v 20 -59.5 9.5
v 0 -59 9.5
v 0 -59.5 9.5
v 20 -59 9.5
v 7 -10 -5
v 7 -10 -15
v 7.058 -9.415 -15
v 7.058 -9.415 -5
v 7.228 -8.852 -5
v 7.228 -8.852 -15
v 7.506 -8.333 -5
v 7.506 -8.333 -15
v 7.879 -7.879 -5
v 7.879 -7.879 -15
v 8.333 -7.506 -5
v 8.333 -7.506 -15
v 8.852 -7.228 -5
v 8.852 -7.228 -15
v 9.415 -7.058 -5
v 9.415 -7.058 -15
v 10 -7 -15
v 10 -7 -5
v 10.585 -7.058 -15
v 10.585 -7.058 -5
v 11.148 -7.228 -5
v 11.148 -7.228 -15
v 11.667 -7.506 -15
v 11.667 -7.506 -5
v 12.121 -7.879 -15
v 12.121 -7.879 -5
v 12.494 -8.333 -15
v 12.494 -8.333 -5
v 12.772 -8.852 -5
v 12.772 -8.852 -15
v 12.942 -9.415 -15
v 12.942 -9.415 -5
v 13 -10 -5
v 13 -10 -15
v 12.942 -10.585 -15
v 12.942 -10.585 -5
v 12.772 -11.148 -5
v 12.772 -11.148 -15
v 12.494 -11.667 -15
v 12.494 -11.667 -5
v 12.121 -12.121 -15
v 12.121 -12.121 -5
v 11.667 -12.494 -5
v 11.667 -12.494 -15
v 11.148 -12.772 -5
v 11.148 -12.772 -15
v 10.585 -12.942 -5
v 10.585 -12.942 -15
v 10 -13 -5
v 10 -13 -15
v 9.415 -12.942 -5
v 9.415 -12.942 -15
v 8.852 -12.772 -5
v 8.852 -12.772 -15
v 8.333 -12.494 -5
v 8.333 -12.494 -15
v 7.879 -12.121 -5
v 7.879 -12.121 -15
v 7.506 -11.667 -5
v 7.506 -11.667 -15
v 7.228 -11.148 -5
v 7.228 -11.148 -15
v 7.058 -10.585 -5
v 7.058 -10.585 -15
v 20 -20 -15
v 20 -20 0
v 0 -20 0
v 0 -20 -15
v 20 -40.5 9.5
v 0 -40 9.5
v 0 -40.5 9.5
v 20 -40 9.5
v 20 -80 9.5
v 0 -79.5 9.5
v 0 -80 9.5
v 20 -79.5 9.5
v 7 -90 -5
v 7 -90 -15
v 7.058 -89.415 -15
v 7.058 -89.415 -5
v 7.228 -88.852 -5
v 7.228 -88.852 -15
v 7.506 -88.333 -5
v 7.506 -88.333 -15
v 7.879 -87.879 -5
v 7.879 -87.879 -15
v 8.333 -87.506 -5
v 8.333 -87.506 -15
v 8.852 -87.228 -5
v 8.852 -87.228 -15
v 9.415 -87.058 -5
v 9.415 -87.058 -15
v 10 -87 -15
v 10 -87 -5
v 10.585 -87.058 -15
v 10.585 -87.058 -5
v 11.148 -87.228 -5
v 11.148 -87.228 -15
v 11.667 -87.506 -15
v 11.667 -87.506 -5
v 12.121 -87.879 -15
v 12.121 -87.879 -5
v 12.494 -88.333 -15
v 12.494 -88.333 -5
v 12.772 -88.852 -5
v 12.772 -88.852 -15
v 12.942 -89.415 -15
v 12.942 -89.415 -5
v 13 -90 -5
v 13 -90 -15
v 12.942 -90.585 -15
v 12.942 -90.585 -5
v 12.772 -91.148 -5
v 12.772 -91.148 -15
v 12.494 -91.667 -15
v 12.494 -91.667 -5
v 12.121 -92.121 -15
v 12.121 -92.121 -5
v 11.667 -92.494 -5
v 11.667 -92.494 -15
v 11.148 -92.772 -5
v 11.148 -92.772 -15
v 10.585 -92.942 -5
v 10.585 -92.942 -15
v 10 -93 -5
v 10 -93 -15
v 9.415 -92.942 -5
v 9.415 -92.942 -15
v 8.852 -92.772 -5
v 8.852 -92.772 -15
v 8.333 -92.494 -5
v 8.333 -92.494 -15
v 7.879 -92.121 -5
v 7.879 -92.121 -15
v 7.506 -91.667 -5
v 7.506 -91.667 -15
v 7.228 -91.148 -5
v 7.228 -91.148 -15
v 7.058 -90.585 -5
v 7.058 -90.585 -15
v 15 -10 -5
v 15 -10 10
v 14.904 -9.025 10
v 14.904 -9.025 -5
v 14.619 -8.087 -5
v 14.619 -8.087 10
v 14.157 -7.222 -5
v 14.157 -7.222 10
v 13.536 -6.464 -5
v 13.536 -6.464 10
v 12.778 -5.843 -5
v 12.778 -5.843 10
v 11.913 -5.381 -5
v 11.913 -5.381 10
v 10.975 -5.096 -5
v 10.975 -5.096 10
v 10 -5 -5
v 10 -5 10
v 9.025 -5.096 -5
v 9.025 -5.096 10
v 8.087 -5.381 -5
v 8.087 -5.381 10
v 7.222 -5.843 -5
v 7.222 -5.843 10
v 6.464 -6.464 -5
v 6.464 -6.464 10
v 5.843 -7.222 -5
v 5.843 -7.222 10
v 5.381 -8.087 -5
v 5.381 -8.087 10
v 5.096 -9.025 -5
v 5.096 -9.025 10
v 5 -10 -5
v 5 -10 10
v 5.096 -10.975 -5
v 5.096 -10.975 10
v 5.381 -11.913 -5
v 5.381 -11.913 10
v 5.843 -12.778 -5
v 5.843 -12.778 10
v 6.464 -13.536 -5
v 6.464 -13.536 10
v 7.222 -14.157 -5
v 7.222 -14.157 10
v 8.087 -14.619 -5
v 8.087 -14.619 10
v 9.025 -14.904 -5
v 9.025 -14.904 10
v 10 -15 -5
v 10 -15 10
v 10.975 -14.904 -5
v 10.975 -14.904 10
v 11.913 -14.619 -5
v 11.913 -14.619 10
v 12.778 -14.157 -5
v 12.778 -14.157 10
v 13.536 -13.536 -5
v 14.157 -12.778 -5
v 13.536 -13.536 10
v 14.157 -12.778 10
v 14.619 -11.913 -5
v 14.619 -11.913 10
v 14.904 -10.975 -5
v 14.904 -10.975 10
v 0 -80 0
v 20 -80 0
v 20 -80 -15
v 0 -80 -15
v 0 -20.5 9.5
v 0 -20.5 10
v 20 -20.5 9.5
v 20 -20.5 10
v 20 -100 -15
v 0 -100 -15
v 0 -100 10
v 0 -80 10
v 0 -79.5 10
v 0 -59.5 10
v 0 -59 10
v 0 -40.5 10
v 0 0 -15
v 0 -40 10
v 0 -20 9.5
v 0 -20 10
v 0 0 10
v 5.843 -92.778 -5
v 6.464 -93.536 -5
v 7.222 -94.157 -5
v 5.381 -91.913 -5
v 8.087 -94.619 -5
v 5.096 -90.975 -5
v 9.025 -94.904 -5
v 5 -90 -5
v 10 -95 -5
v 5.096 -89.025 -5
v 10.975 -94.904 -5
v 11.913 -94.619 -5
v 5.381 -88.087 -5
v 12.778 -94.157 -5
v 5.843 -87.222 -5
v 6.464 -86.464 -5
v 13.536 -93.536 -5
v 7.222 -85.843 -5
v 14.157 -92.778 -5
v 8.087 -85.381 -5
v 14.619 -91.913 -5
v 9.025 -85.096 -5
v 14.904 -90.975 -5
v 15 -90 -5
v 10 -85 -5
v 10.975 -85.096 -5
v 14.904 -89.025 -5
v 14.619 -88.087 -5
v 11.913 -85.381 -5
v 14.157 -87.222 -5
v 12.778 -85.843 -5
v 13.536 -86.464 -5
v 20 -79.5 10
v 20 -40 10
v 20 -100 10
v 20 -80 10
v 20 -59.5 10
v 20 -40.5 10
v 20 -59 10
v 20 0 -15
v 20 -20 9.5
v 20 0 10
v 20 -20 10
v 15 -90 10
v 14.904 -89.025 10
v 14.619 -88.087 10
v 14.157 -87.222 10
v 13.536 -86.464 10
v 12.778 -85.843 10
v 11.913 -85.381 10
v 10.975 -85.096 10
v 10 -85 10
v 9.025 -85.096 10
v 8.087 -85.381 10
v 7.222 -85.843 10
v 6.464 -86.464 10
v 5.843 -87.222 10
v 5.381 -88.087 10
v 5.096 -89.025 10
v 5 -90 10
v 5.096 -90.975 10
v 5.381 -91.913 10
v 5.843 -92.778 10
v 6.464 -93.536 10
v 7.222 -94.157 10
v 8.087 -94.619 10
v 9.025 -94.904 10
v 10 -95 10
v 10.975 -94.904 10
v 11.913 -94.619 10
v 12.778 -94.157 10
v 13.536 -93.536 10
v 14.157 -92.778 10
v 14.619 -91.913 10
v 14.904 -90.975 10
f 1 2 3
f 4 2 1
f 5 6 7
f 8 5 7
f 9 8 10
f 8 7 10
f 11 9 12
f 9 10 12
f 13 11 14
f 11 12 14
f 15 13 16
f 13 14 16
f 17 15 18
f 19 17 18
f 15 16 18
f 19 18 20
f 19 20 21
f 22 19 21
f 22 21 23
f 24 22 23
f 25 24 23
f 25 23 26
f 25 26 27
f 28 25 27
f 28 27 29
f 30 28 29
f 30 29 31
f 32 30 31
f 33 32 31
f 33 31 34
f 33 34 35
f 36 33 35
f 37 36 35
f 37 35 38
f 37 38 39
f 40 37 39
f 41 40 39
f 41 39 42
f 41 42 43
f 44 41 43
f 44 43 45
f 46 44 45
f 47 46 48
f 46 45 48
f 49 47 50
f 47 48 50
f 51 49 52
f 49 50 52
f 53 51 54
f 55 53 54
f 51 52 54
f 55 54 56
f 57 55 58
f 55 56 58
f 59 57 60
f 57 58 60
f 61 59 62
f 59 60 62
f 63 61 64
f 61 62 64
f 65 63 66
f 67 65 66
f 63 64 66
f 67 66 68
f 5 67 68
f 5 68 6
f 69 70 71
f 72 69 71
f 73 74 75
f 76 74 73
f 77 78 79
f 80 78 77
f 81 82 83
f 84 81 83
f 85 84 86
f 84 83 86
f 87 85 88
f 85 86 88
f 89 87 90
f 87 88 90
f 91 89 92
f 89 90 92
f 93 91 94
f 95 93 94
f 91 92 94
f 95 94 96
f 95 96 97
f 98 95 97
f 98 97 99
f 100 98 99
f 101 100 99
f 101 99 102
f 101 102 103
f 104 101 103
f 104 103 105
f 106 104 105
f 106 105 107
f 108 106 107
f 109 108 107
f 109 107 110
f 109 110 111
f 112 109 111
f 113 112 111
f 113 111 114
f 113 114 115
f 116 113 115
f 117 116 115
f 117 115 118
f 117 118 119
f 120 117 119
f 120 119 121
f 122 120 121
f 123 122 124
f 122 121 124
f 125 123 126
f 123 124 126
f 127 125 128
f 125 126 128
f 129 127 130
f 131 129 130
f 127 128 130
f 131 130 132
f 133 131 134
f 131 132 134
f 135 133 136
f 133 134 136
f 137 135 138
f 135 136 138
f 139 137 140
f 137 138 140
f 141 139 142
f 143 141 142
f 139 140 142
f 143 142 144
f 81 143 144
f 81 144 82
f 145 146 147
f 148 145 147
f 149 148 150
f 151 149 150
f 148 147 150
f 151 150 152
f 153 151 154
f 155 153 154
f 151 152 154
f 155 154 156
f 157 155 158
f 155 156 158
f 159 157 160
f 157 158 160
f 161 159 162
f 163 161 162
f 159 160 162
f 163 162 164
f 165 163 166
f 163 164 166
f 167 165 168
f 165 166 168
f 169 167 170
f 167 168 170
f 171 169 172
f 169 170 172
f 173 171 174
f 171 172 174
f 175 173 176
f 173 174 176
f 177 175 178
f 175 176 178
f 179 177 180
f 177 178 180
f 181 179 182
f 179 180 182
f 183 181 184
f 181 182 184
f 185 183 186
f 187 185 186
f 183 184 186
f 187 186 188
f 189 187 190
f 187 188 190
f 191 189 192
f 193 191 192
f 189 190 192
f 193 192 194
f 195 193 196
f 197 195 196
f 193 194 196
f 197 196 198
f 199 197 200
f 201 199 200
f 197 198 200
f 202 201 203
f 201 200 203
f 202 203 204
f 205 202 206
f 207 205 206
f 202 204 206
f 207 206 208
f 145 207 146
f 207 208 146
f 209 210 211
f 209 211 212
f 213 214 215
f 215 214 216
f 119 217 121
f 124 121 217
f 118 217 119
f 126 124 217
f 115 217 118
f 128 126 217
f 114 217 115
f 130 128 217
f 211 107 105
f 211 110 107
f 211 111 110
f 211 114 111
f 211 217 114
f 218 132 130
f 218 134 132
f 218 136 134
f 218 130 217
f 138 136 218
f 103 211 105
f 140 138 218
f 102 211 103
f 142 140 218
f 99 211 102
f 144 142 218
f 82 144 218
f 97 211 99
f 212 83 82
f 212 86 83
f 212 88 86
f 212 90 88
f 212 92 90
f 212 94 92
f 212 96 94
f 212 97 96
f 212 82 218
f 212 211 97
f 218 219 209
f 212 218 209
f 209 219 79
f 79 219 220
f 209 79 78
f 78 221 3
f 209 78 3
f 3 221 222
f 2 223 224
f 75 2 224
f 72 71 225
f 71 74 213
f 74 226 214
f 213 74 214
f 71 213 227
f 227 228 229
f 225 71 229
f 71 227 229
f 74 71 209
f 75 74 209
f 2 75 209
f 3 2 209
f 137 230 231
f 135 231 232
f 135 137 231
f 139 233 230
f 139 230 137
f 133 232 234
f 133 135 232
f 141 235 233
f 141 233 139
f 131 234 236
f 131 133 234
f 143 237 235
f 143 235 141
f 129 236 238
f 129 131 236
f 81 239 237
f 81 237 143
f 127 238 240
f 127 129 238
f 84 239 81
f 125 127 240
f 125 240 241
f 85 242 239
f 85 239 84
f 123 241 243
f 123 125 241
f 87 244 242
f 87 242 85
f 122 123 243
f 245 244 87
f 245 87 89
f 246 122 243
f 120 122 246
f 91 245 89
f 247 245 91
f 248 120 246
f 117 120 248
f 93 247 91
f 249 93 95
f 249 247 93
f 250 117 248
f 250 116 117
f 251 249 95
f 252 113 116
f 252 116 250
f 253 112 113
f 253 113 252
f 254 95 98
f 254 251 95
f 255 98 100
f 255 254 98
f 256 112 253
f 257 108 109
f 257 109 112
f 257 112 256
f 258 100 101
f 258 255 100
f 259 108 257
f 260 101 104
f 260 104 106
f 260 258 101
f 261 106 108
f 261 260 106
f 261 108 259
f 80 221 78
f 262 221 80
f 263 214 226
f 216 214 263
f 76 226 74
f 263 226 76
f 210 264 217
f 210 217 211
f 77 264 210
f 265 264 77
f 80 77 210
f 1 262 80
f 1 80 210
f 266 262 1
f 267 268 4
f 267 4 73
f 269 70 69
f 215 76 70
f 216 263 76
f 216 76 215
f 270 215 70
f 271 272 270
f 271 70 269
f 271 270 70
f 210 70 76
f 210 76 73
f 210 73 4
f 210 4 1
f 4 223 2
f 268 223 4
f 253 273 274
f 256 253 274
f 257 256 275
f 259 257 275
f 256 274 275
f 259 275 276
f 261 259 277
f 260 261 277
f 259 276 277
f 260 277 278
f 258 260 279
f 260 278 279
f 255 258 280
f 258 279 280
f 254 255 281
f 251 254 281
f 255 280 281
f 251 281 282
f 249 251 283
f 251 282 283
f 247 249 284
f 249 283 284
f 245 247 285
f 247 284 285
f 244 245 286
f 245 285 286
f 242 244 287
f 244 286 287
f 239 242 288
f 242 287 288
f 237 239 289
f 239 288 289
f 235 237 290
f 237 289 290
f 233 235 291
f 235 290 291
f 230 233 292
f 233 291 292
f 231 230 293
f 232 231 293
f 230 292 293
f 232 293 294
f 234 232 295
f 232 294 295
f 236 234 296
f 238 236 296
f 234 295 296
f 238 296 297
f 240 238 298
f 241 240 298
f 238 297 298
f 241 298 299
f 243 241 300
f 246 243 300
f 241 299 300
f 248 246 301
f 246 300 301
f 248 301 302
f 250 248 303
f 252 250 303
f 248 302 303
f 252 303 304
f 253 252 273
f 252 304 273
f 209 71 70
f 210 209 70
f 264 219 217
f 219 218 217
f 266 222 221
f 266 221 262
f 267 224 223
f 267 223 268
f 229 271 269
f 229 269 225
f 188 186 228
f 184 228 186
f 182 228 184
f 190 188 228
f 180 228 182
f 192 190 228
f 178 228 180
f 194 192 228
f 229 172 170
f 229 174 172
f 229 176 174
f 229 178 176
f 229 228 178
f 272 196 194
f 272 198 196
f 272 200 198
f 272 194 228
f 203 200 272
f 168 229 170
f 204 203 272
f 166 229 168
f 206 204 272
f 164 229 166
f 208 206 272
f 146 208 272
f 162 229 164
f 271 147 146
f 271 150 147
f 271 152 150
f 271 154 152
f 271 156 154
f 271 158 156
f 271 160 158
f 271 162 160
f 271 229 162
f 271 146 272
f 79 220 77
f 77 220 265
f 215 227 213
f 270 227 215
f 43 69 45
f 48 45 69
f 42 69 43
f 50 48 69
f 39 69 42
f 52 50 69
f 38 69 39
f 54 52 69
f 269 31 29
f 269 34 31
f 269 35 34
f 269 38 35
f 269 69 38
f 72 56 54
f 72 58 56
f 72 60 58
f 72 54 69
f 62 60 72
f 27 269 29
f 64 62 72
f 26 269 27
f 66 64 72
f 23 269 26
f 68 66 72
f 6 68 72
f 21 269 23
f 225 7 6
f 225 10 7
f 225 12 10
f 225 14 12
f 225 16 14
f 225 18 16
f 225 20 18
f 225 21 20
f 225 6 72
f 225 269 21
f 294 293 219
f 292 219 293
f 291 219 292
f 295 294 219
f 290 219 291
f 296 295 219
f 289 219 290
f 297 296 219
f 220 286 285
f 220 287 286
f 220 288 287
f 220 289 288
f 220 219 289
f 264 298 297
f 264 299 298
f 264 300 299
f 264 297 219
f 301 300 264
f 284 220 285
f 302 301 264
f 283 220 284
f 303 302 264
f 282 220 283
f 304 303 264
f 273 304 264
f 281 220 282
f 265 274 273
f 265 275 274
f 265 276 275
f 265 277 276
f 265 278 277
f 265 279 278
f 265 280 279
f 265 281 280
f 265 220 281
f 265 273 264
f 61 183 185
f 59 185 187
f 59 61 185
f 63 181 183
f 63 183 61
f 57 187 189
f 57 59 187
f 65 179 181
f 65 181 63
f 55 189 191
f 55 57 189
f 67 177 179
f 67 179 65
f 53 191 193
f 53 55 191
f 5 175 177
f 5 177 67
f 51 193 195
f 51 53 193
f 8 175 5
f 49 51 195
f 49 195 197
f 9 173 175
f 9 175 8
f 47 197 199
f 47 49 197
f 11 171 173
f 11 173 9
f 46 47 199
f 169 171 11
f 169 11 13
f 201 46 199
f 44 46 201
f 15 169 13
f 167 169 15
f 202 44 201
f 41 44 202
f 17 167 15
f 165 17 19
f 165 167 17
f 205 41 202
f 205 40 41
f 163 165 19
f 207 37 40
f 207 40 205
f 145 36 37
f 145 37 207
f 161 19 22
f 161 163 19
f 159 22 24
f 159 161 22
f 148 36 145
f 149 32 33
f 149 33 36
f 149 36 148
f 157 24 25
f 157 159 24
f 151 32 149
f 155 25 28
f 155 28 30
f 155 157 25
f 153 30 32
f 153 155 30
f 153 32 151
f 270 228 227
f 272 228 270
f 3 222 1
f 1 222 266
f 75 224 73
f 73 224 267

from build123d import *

# Parameters (mm, degrees)
SKETCH_1_W          = 20
SKETCH_1_H          = 100
EXTRUDE_1_DEPTH     = 10
SKETCH_2_W          = 20
SKETCH_2_H          = 20
EXTRUDE_2_DEPTH     = 15
SKETCH_3_R          = 3
CUT_EXTRUDE_1_DEPTH = 106
SKETCH_4_R          = 5
CUT_EXTRUDE_2_DEPTH = 15
SKETCH_5_W          = 20
SKETCH_5_H          = 0.5
CUT_EXTRUDE_3_DEPTH = 0.5


with BuildPart() as part:
    # 草图1 → 凸台-拉伸1 (new body)
    with BuildSketch(Plane.XY):
        with Locations((10, -50)):
            Rectangle(SKETCH_1_W, SKETCH_1_H)
    extrude(amount=EXTRUDE_1_DEPTH)

    # 草图2 → 凸台-拉伸2 (add)
    with BuildSketch(Plane(origin=(0, 0, 0), x_dir=(-1, 0, 0), z_dir=(0, 0, -1))):
        with Locations((-10, -10)):
            Rectangle(SKETCH_2_W, SKETCH_2_H)
        with Locations((-10, -90)):
            Rectangle(SKETCH_2_W, SKETCH_2_H)
    extrude(amount=EXTRUDE_2_DEPTH)

    # 草图3 → 切除-拉伸1 (cut, through all)
    with BuildSketch(Plane(origin=(0, 0, -15), x_dir=(-1, 0, 0), z_dir=(0, 0, -1))):
        with Locations((-10, -10)):
            Circle(SKETCH_3_R)
        with Locations((-10, -90)):
            Circle(SKETCH_3_R)
    extrude(amount=-CUT_EXTRUDE_1_DEPTH, mode=Mode.SUBTRACT)

    # 草图4 → 切除-拉伸2 (cut)
    with BuildSketch(Plane.XY.offset(10)):
        with Locations((10, -10)):
            Circle(SKETCH_4_R)
        with Locations((10, -90)):
            Circle(SKETCH_4_R)
    extrude(amount=-CUT_EXTRUDE_2_DEPTH, mode=Mode.SUBTRACT)

    # 草图5 → 切除-拉伸3 (cut)
    with BuildSketch(Plane.XY.offset(10)):
        with Locations((10, -79.75)):
            Rectangle(SKETCH_5_W, SKETCH_5_H)
        with Locations((10, -59.25)):
            Rectangle(SKETCH_5_W, SKETCH_5_H)
        with Locations((10, -40.25)):
            Rectangle(SKETCH_5_W, SKETCH_5_H)
        with Locations((10, -20.25)):
            Rectangle(SKETCH_5_W, SKETCH_5_H)
    extrude(amount=-CUT_EXTRUDE_3_DEPTH, mode=Mode.SUBTRACT)


solid = part.part
